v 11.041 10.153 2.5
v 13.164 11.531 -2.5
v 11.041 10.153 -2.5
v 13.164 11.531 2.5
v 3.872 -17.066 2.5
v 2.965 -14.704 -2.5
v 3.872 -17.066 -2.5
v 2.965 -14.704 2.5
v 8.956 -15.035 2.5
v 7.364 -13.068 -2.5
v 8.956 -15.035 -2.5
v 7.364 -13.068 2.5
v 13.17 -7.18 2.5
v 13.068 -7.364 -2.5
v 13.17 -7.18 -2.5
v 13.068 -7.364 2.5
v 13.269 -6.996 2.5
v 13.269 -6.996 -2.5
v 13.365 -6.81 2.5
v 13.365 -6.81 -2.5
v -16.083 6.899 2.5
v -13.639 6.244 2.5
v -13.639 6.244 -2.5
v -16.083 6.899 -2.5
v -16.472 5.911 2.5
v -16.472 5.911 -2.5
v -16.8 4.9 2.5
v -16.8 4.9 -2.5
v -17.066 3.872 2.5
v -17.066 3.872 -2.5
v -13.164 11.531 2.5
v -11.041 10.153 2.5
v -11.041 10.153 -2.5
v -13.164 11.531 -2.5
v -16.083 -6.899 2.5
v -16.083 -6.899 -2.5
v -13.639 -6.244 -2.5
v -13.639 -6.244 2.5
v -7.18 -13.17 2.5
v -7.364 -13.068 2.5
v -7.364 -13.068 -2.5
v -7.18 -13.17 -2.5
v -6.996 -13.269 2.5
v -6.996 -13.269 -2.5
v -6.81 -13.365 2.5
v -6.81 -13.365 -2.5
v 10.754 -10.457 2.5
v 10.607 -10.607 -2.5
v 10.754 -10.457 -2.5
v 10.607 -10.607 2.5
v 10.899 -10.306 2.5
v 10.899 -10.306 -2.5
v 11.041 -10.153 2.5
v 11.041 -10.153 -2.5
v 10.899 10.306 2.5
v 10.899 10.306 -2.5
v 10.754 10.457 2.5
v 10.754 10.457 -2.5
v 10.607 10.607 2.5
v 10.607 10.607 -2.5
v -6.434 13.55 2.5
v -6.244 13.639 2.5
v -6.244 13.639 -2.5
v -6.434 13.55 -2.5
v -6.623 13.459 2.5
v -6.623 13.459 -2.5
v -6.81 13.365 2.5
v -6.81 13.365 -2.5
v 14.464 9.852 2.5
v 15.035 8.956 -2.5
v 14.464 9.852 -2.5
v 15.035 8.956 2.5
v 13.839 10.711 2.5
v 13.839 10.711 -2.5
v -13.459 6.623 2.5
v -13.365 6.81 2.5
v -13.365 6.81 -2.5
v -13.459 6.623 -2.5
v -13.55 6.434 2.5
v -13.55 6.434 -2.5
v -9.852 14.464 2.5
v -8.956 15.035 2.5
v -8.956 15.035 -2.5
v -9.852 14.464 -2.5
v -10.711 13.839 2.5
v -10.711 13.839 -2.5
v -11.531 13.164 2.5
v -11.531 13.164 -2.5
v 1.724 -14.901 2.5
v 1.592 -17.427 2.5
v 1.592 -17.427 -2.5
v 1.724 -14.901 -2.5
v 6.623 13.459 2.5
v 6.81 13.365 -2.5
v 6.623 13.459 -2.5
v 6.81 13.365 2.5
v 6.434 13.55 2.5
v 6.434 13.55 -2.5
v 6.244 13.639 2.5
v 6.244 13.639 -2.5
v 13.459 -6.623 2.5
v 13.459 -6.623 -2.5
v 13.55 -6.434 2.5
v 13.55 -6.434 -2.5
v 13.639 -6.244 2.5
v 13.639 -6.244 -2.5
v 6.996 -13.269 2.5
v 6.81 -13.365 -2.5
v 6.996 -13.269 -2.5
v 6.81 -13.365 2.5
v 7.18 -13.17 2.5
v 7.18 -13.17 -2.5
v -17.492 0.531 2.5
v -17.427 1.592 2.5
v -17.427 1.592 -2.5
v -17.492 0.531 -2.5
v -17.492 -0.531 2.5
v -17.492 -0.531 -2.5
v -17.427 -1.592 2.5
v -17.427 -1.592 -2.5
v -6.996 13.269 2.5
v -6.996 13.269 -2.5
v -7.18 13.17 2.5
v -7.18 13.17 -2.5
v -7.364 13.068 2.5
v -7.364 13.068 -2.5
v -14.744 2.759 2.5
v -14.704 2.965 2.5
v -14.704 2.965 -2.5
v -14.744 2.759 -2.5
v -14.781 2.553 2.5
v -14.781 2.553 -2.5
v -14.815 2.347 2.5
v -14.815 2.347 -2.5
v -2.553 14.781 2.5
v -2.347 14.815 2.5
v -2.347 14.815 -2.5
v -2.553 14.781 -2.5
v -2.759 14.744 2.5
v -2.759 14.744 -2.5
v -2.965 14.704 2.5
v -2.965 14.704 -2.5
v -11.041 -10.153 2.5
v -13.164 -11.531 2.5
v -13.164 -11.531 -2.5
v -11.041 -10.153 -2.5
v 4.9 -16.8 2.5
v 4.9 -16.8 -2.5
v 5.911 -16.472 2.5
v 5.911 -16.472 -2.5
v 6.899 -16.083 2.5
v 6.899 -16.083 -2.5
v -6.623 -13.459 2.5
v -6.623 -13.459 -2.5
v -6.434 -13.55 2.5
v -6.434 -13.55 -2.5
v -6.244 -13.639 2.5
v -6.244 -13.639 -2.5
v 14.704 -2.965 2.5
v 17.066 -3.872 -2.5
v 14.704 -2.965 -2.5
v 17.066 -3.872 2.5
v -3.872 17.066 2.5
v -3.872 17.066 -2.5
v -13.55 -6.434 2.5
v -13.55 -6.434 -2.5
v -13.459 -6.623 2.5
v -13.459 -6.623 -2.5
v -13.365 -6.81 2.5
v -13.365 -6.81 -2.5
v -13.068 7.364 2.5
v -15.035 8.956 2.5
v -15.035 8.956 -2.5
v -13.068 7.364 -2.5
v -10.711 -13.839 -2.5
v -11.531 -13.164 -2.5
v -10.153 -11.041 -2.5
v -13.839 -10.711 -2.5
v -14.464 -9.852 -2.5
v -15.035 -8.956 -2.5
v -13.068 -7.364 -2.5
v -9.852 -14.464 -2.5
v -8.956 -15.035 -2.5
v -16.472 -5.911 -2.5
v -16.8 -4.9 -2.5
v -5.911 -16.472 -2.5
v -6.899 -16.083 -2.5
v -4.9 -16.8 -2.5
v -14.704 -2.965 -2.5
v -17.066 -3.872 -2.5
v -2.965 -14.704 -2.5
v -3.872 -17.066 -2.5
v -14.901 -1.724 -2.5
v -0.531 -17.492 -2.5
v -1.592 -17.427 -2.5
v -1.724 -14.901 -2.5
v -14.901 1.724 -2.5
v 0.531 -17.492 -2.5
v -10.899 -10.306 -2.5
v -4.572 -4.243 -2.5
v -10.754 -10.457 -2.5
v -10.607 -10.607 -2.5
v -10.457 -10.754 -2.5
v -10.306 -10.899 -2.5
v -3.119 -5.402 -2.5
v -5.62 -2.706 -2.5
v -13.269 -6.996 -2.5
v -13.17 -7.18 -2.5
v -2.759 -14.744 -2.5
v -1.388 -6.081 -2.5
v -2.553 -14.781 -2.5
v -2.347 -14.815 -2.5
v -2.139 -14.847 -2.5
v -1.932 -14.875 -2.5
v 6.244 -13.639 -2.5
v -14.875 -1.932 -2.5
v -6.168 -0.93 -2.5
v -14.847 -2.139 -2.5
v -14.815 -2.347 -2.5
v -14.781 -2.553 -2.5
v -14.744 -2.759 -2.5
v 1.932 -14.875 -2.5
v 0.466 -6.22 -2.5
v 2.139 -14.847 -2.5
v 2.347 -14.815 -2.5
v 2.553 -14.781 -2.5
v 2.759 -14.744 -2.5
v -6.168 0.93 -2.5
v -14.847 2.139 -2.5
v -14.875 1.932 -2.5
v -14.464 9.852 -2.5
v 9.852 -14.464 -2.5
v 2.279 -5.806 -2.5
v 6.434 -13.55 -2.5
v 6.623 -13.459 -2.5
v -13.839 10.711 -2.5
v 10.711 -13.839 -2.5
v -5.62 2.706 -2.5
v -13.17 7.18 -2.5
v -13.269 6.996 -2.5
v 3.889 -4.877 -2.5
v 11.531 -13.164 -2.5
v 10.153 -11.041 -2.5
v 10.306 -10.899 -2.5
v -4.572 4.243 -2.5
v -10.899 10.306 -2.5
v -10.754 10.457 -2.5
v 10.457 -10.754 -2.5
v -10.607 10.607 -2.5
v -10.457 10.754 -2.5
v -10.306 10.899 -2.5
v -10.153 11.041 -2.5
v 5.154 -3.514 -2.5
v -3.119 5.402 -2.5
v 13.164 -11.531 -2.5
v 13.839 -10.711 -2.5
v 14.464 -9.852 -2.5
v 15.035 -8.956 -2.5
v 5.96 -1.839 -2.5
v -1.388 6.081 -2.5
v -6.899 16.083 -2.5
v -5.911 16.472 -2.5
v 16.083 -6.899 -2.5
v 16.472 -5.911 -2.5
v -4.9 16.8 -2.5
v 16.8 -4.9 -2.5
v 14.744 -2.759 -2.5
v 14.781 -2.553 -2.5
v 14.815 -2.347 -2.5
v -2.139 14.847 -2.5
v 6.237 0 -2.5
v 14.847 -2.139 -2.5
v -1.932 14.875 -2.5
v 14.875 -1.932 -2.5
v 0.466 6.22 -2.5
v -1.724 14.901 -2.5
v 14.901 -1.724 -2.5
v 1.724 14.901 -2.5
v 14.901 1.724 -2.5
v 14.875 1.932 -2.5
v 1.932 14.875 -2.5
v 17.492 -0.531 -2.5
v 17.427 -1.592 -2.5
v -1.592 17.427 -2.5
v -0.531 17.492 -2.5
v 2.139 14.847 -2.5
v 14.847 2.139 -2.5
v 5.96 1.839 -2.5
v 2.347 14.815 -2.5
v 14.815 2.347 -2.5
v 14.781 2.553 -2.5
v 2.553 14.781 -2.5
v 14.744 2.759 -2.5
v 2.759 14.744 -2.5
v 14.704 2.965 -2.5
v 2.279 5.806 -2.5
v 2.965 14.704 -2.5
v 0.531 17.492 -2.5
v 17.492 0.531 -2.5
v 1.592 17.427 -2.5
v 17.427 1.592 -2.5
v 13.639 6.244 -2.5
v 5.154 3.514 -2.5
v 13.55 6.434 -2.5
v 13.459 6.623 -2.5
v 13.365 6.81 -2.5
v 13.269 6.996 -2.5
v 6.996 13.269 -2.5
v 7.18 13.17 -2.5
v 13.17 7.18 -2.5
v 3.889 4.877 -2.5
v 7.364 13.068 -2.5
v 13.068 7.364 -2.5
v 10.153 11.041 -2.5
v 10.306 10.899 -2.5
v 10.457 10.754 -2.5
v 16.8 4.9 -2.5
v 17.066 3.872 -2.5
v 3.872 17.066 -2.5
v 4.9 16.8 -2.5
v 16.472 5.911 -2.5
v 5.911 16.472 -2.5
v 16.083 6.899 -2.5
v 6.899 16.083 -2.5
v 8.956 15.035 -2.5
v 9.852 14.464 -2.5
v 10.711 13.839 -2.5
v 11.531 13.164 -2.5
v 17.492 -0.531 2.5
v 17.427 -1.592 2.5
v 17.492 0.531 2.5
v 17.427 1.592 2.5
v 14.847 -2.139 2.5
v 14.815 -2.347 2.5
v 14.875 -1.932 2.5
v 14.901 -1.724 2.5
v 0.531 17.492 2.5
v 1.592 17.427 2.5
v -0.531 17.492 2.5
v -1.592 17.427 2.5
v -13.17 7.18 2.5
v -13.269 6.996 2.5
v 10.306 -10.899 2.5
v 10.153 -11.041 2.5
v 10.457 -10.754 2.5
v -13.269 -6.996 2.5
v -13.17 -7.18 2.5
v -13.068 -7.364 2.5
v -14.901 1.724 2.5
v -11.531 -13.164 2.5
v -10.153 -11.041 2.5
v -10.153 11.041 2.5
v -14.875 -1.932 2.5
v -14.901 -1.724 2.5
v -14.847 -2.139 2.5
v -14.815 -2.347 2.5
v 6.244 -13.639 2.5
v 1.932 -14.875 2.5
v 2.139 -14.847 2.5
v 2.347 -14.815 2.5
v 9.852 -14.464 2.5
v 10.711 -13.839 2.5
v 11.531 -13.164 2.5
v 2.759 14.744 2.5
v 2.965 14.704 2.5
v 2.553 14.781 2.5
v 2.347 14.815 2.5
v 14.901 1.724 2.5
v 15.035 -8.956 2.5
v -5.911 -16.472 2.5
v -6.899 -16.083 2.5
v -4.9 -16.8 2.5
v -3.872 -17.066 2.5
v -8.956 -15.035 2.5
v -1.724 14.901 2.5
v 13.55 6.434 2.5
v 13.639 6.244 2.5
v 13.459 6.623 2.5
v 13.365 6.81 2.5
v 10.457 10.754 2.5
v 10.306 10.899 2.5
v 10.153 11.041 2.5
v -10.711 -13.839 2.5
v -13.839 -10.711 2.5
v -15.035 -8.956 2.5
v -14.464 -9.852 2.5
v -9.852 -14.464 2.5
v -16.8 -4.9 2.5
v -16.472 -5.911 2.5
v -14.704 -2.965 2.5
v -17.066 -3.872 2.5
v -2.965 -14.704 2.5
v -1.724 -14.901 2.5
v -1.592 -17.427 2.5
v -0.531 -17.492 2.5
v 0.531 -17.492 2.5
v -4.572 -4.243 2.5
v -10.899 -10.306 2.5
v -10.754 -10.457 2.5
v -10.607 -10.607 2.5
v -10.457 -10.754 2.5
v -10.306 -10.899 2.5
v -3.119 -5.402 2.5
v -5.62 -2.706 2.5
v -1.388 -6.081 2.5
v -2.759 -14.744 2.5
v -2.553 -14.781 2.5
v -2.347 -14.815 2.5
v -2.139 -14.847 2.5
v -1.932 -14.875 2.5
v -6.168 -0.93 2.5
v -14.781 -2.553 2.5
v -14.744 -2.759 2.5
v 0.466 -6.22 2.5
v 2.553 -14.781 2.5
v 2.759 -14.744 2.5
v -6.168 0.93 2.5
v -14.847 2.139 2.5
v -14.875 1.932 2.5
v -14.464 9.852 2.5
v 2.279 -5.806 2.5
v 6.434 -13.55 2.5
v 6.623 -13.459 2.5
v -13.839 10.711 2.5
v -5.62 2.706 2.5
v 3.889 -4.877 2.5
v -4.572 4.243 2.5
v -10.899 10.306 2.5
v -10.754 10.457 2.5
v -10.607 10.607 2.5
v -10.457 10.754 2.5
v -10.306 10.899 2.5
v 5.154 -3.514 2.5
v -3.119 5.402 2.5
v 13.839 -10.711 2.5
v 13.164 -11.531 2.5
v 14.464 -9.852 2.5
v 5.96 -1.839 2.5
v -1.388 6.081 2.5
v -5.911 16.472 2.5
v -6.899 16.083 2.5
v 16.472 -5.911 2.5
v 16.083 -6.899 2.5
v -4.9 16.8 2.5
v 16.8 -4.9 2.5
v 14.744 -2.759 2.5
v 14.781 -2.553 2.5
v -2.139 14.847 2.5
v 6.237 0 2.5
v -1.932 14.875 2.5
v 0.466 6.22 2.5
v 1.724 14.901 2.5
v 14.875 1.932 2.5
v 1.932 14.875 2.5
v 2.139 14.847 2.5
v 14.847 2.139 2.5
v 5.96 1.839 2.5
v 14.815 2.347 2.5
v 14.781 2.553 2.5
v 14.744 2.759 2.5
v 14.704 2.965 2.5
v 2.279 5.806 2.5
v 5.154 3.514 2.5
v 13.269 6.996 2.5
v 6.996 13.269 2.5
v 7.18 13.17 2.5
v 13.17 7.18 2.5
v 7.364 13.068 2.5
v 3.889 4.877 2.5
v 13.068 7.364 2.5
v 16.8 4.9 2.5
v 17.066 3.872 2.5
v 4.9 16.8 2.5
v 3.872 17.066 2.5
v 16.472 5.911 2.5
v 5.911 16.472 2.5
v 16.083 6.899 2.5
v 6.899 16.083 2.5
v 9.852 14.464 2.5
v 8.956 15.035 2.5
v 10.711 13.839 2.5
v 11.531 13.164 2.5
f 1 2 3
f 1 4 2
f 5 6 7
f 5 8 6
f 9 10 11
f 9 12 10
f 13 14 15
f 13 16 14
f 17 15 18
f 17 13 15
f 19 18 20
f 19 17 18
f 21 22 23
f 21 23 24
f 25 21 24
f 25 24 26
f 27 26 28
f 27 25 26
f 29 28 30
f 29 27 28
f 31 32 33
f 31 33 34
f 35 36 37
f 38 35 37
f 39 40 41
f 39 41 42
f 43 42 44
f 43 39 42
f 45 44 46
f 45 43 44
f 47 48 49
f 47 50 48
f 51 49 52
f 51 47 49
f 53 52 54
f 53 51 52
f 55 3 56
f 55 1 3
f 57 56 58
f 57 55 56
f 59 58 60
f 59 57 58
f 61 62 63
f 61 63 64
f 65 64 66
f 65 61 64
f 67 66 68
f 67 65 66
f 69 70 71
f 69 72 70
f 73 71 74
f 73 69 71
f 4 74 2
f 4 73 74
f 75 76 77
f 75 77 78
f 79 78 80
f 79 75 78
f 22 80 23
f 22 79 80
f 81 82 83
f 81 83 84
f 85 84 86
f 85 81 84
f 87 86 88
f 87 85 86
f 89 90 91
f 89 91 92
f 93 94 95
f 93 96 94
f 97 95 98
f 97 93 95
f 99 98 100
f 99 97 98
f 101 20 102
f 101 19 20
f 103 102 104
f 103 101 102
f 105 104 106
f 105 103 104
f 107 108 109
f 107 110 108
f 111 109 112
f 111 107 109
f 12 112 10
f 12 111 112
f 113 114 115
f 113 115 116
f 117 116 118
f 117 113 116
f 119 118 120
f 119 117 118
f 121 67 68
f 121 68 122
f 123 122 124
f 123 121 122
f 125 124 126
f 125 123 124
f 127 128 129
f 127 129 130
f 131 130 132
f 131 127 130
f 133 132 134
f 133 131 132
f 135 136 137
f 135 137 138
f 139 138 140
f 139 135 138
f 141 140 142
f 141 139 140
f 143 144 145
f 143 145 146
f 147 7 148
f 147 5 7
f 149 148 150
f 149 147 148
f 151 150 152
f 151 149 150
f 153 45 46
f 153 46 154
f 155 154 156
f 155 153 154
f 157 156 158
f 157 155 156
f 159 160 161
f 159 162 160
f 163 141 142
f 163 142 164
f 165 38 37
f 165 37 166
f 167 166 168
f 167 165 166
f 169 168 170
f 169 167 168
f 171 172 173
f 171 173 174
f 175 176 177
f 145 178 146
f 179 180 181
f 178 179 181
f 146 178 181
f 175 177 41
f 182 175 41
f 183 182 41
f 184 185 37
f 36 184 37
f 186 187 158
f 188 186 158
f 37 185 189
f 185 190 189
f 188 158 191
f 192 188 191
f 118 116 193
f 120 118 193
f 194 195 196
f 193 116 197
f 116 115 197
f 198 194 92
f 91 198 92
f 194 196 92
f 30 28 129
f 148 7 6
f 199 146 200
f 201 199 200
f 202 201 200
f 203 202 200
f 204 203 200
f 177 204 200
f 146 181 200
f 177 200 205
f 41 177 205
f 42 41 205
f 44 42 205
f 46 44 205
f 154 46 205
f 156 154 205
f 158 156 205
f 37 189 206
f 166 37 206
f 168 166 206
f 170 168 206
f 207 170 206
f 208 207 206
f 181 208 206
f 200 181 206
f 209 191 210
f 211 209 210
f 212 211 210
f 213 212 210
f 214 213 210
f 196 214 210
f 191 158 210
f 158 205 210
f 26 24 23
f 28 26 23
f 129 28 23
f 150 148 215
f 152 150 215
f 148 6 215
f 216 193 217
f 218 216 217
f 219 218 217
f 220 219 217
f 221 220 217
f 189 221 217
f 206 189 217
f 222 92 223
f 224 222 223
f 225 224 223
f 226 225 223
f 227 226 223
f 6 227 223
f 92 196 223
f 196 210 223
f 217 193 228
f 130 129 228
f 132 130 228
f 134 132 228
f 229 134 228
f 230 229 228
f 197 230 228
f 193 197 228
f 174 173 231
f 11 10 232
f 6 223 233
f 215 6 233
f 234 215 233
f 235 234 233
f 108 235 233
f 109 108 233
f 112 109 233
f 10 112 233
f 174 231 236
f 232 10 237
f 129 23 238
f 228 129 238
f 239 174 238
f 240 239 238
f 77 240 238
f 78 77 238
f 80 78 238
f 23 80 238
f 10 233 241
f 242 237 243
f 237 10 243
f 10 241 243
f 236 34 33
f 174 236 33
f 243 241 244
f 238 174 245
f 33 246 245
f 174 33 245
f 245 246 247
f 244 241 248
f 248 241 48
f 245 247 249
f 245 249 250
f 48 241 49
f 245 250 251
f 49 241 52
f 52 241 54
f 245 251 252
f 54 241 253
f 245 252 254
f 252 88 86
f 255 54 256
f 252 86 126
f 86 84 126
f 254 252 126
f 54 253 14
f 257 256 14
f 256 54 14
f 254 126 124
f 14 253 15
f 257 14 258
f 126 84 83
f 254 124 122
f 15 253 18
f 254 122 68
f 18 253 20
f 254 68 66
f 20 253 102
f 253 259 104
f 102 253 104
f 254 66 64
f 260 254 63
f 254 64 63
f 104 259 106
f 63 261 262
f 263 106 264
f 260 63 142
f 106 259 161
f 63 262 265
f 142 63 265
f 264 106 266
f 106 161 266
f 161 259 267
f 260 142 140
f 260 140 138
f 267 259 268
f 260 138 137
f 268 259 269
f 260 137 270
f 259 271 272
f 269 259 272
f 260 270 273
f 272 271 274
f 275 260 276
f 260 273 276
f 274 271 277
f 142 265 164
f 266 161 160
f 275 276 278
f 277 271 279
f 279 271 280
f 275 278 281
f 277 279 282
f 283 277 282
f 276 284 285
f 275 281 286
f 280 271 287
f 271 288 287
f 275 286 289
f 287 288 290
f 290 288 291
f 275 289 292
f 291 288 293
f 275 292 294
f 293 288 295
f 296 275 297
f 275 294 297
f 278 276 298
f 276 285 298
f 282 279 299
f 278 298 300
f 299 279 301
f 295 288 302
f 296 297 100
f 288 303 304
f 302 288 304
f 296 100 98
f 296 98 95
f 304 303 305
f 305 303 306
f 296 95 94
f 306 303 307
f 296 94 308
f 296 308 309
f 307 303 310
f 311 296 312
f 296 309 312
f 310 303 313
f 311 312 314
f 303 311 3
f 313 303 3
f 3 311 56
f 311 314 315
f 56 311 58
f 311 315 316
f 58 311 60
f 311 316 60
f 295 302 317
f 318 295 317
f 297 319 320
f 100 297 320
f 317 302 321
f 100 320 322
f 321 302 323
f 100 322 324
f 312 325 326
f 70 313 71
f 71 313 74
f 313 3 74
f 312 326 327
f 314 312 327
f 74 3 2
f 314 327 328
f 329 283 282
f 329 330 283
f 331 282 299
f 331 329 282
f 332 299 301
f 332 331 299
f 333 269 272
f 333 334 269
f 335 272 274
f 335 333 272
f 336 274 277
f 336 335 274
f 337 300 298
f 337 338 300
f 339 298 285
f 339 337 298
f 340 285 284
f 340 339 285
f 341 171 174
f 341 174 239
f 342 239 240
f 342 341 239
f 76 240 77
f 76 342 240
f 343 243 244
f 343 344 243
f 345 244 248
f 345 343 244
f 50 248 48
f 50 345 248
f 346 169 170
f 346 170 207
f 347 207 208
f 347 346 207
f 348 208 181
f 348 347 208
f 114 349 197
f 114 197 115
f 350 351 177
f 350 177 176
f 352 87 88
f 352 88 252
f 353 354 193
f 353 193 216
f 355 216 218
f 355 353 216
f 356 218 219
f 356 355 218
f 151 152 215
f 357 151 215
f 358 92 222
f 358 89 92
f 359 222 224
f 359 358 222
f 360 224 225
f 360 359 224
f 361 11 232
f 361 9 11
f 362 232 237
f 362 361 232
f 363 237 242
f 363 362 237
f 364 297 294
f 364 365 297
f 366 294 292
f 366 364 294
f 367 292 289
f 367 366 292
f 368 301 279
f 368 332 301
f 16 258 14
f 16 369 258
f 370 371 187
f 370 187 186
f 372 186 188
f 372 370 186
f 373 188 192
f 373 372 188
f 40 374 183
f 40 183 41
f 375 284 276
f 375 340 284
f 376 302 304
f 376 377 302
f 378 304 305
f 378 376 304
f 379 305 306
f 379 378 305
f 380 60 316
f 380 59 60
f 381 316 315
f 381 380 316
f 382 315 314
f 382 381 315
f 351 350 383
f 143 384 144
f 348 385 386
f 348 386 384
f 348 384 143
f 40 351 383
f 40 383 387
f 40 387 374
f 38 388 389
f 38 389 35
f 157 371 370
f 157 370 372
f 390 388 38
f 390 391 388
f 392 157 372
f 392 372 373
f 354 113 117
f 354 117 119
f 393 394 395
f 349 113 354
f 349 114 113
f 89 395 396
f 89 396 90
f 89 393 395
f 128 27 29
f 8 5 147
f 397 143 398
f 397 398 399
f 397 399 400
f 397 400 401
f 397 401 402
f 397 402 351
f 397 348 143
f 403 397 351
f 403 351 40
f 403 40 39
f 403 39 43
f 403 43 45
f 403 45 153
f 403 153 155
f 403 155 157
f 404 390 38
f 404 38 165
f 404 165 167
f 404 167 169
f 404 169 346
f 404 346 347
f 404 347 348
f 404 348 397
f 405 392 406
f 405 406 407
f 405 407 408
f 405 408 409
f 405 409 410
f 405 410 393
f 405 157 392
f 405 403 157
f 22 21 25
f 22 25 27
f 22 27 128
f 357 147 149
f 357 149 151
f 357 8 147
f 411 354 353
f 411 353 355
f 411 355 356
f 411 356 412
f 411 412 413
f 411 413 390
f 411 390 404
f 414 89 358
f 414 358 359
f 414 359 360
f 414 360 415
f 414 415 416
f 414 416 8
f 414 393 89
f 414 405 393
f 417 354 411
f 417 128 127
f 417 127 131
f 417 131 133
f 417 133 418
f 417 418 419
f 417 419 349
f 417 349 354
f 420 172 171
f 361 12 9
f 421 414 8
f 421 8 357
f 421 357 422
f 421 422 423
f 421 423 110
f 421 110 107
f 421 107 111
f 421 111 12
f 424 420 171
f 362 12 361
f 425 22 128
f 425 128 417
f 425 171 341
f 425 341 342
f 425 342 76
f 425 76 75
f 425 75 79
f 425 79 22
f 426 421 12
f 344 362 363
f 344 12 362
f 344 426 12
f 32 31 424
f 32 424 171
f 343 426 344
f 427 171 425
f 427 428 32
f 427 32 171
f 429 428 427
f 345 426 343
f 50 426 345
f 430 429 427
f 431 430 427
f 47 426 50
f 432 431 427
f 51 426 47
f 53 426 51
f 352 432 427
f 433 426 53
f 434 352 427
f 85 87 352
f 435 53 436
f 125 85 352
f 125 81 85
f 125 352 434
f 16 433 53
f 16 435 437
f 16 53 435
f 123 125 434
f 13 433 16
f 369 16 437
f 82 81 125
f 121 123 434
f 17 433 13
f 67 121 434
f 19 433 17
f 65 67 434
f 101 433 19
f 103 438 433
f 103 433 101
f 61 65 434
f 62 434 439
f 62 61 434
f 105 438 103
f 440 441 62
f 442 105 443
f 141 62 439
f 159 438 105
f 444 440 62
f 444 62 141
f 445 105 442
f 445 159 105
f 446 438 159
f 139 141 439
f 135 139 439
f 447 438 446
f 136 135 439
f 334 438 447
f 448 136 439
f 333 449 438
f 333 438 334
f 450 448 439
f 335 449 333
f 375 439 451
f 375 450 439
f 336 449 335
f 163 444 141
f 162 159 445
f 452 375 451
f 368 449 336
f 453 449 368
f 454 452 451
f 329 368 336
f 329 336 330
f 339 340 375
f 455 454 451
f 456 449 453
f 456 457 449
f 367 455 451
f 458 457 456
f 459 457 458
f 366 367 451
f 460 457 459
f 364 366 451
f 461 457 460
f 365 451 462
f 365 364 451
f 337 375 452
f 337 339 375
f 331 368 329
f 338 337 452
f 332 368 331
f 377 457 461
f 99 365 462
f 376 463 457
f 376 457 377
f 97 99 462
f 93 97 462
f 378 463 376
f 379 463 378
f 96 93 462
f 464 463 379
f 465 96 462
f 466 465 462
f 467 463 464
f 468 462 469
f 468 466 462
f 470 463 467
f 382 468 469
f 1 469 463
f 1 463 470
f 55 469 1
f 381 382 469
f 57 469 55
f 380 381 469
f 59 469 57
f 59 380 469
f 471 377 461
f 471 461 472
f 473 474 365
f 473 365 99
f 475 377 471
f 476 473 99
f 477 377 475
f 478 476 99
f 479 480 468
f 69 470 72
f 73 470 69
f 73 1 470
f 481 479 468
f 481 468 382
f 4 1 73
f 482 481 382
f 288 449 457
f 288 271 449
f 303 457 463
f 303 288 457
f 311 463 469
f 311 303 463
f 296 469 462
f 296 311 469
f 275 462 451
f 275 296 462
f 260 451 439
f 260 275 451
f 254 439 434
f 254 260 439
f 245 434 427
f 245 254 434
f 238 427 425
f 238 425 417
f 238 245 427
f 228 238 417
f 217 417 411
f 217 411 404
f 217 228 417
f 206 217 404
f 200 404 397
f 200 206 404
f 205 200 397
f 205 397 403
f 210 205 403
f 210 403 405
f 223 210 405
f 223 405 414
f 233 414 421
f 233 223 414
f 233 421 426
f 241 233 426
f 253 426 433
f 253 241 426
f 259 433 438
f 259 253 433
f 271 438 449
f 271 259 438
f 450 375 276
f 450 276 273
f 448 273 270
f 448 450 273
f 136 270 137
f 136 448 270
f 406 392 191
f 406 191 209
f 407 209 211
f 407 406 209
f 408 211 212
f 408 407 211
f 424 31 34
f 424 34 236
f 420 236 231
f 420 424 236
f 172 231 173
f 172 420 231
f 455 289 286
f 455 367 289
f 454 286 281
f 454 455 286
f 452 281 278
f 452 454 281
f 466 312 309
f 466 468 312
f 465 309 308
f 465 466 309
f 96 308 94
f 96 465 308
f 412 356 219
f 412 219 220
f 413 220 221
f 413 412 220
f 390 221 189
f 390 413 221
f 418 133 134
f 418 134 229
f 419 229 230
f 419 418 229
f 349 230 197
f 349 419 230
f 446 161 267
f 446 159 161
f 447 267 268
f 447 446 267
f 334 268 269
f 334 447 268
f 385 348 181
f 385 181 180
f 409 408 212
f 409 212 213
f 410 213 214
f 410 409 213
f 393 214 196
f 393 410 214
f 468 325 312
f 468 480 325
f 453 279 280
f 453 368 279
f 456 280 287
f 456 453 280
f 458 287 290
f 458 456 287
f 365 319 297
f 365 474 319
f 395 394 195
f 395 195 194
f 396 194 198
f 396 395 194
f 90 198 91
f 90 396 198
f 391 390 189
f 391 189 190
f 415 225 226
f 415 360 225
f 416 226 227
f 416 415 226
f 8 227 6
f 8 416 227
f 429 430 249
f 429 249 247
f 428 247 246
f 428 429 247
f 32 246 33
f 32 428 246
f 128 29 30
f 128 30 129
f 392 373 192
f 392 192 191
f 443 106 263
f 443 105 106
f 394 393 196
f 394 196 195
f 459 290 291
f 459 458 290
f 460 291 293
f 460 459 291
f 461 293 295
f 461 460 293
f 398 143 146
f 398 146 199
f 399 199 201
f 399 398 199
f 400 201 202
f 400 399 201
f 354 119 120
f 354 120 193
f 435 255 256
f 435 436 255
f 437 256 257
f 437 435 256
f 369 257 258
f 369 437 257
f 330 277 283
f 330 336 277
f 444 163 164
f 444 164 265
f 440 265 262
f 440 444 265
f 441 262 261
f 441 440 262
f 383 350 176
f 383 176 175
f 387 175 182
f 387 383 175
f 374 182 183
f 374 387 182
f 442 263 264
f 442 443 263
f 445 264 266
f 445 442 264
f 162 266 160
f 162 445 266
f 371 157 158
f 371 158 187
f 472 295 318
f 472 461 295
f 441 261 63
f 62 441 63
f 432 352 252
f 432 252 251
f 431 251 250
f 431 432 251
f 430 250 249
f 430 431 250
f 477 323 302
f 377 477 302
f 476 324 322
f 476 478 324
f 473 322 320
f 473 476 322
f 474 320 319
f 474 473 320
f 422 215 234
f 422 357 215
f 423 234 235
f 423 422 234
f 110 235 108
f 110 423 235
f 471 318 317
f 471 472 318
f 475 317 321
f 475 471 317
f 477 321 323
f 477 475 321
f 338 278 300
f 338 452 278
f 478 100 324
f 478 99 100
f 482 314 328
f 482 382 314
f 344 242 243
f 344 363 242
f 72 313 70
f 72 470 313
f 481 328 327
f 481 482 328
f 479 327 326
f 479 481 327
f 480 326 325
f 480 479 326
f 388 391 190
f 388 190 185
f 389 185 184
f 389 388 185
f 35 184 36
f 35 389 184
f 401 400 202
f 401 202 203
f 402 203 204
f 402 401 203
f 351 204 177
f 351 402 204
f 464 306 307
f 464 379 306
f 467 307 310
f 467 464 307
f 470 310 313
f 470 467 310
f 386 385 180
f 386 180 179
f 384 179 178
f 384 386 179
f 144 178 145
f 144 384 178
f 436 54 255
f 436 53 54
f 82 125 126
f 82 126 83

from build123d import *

# Parameters (mm, degrees)
F0_R     = 6.23749
F1_DEPTH = 2.5


with BuildPart() as f1:
    # F0 (on Top) → F1 (new body, symmetric)
    with BuildSketch(Plane.XY):
        with BuildLine():
            Line((-1.591629, 17.42747), (-1.724057, 14.900591))
            ThreePointArc((-1.724057, 14.900591), (-2.035734, 14.861218), (-2.346517, 14.815325))
            ThreePointArc((-2.346517, 14.815325), (-2.656271, 14.762934), (-2.96486, 14.704068))
            Line((-2.96486, 14.704068), (-3.871655, 17.06635))
            ThreePointArc((-3.871655, 17.06635), (-5.407797, 16.643489), (-6.899114, 16.082669))
            Line((-6.899114, 16.082669), (-6.244212, 13.638542))
            ThreePointArc((-6.244212, 13.638542), (-6.528466, 13.504782), (-6.809857, 13.365098))
            ThreePointArc((-6.809857, 13.365098), (-7.088261, 13.219552), (-7.363556, 13.068207))
            Line((-7.363556, 13.068207), (-8.955955, 15.034656))
            ThreePointArc((-8.955955, 15.034656), (-10.286242, 14.157797), (-11.531265, 13.163583))
            Line((-11.531265, 13.163583), (-10.15314, 11.041456))
            ThreePointArc((-10.15314, 11.041456), (-10.382148, 10.826403), (-10.606602, 10.606602))
            ThreePointArc((-10.606602, 10.606602), (-10.826403, 10.382148), (-11.041456, 10.15314))
            Line((-11.041456, 10.15314), (-13.163583, 11.531265))
            ThreePointArc((-13.163583, 11.531265), (-14.157797, 10.286242), (-15.034656, 8.955955))
            Line((-15.034656, 8.955955), (-13.068207, 7.363556))
            ThreePointArc((-13.068207, 7.363556), (-13.219552, 7.088261), (-13.365098, 6.809857))
            ThreePointArc((-13.365098, 6.809857), (-13.504782, 6.528466), (-13.638542, 6.244212))
            Line((-13.638542, 6.244212), (-16.082669, 6.899114))
            ThreePointArc((-16.082669, 6.899114), (-16.643489, 5.407797), (-17.06635, 3.871655))
            Line((-17.06635, 3.871655), (-14.704068, 2.96486))
            ThreePointArc((-14.704068, 2.96486), (-14.762934, 2.656271), (-14.815325, 2.346517))
            ThreePointArc((-14.815325, 2.346517), (-14.861218, 2.035734), (-14.900591, 1.724057))
            Line((-14.900591, 1.724057), (-17.42747, 1.591629))
            ThreePointArc((-17.42747, 1.591629), (-17.5, 0), (-17.42747, -1.591629))
            Line((-17.42747, -1.591629), (-14.900591, -1.724057))
            ThreePointArc((-14.900591, -1.724057), (-14.861218, -2.035734), (-14.815325, -2.346517))
            ThreePointArc((-14.815325, -2.346517), (-14.762934, -2.656271), (-14.704068, -2.96486))
            Line((-14.704068, -2.96486), (-17.06635, -3.871655))
            ThreePointArc((-17.06635, -3.871655), (-16.643489, -5.407797), (-16.082669, -6.899114))
            Line((-16.082669, -6.899114), (-13.638542, -6.244212))
            ThreePointArc((-13.638542, -6.244212), (-13.504782, -6.528466), (-13.365098, -6.809857))
            ThreePointArc((-13.365098, -6.809857), (-13.219552, -7.088261), (-13.068207, -7.363556))
            Line((-13.068207, -7.363556), (-15.034656, -8.955955))
            ThreePointArc((-15.034656, -8.955955), (-14.157797, -10.286242), (-13.163583, -11.531265))
            Line((-13.163583, -11.531265), (-11.041456, -10.15314))
            ThreePointArc((-11.041456, -10.15314), (-10.826403, -10.382148), (-10.606602, -10.606602))
            ThreePointArc((-10.606602, -10.606602), (-10.382148, -10.826403), (-10.15314, -11.041456))
            Line((-10.15314, -11.041456), (-11.531265, -13.163583))
            ThreePointArc((-11.531265, -13.163583), (-10.286242, -14.157797), (-8.955955, -15.034656))
            Line((-8.955955, -15.034656), (-7.363556, -13.068207))
            ThreePointArc((-7.363556, -13.068207), (-7.088261, -13.219552), (-6.809857, -13.365098))
            ThreePointArc((-6.809857, -13.365098), (-6.528466, -13.504782), (-6.244212, -13.638542))
            Line((-6.244212, -13.638542), (-6.899114, -16.082669))
            ThreePointArc((-6.899114, -16.082669), (-5.407797, -16.643489), (-3.871655, -17.06635))
            Line((-3.871655, -17.06635), (-2.96486, -14.704068))
            ThreePointArc((-2.96486, -14.704068), (-2.656271, -14.762934), (-2.346517, -14.815325))
            ThreePointArc((-2.346517, -14.815325), (-2.035734, -14.861218), (-1.724057, -14.900591))
            Line((-1.724057, -14.900591), (-1.591629, -17.42747))
            ThreePointArc((-1.591629, -17.42747), (0, -17.5), (1.591629, -17.42747))
            Line((1.591629, -17.42747), (1.724057, -14.900591))
            ThreePointArc((1.724057, -14.900591), (2.035734, -14.861218), (2.346517, -14.815325))
            ThreePointArc((2.346517, -14.815325), (2.656271, -14.762934), (2.96486, -14.704068))
            Line((2.96486, -14.704068), (3.871655, -17.06635))
            ThreePointArc((3.871655, -17.06635), (5.407797, -16.643489), (6.899114, -16.082669))
            Line((6.899114, -16.082669), (6.244212, -13.638542))
            ThreePointArc((6.244212, -13.638542), (6.528466, -13.504782), (6.809857, -13.365098))
            ThreePointArc((6.809857, -13.365098), (7.088261, -13.219552), (7.363556, -13.068207))
            Line((7.363556, -13.068207), (8.955955, -15.034656))
            ThreePointArc((8.955955, -15.034656), (10.286242, -14.157797), (11.531265, -13.163583))
            Line((11.531265, -13.163583), (10.15314, -11.041456))
            ThreePointArc((10.15314, -11.041456), (10.382148, -10.826403), (10.606602, -10.606602))
            ThreePointArc((10.606602, -10.606602), (10.826403, -10.382148), (11.041456, -10.15314))
            Line((11.041456, -10.15314), (13.163583, -11.531265))
            ThreePointArc((13.163583, -11.531265), (14.157797, -10.286242), (15.034656, -8.955955))
            Line((15.034656, -8.955955), (13.068207, -7.363556))
            ThreePointArc((13.068207, -7.363556), (13.219552, -7.088261), (13.365098, -6.809857))
            ThreePointArc((13.365098, -6.809857), (13.504782, -6.528466), (13.638542, -6.244212))
            Line((13.638542, -6.244212), (16.082669, -6.899114))
            ThreePointArc((16.082669, -6.899114), (16.643489, -5.407797), (17.06635, -3.871655))
            Line((17.06635, -3.871655), (14.704068, -2.96486))
            ThreePointArc((14.704068, -2.96486), (14.762934, -2.656271), (14.815325, -2.346517))
            ThreePointArc((14.815325, -2.346517), (14.861218, -2.035734), (14.900591, -1.724057))
            Line((14.900591, -1.724057), (17.42747, -1.591629))
            ThreePointArc((17.42747, -1.591629), (17.5, 0), (17.42747, 1.591629))
            Line((17.42747, 1.591629), (14.900591, 1.724057))
            ThreePointArc((14.900591, 1.724057), (14.861218, 2.035734), (14.815325, 2.346517))
            ThreePointArc((14.815325, 2.346517), (14.762934, 2.656271), (14.704068, 2.96486))
            Line((14.704068, 2.96486), (17.06635, 3.871655))
            ThreePointArc((17.06635, 3.871655), (16.643489, 5.407797), (16.082669, 6.899114))
            Line((16.082669, 6.899114), (13.638542, 6.244212))
            ThreePointArc((13.638542, 6.244212), (13.504782, 6.528466), (13.365098, 6.809857))
            ThreePointArc((13.365098, 6.809857), (13.219552, 7.088261), (13.068207, 7.363556))
            Line((13.068207, 7.363556), (15.034656, 8.955955))
            ThreePointArc((15.034656, 8.955955), (14.157797, 10.286242), (13.163583, 11.531265))
            Line((13.163583, 11.531265), (11.041456, 10.15314))
            ThreePointArc((11.041456, 10.15314), (10.826403, 10.382148), (10.606602, 10.606602))
            ThreePointArc((10.606602, 10.606602), (10.382148, 10.826403), (10.15314, 11.041456))
            Line((10.15314, 11.041456), (11.531265, 13.163583))
            ThreePointArc((11.531265, 13.163583), (10.286242, 14.157797), (8.955955, 15.034656))
            Line((8.955955, 15.034656), (7.363556, 13.068207))
            ThreePointArc((7.363556, 13.068207), (7.088261, 13.219552), (6.809857, 13.365098))
            ThreePointArc((6.809857, 13.365098), (6.528466, 13.504782), (6.244212, 13.638542))
            Line((6.244212, 13.638542), (6.899114, 16.082669))
            ThreePointArc((6.899114, 16.082669), (5.407797, 16.643489), (3.871655, 17.06635))
            Line((3.871655, 17.06635), (2.96486, 14.704068))
            ThreePointArc((2.96486, 14.704068), (2.656271, 14.762934), (2.346517, 14.815325))
            ThreePointArc((2.346517, 14.815325), (2.035734, 14.861218), (1.724057, 14.900591))
            Line((1.724057, 14.900591), (1.591629, 17.42747))
            ThreePointArc((1.591629, 17.42747), (0, 17.5), (-1.591629, 17.42747))
        make_face()
        Circle(F0_R, mode=Mode.SUBTRACT)
    extrude(amount=F1_DEPTH, both=True)


solid = f1.part
